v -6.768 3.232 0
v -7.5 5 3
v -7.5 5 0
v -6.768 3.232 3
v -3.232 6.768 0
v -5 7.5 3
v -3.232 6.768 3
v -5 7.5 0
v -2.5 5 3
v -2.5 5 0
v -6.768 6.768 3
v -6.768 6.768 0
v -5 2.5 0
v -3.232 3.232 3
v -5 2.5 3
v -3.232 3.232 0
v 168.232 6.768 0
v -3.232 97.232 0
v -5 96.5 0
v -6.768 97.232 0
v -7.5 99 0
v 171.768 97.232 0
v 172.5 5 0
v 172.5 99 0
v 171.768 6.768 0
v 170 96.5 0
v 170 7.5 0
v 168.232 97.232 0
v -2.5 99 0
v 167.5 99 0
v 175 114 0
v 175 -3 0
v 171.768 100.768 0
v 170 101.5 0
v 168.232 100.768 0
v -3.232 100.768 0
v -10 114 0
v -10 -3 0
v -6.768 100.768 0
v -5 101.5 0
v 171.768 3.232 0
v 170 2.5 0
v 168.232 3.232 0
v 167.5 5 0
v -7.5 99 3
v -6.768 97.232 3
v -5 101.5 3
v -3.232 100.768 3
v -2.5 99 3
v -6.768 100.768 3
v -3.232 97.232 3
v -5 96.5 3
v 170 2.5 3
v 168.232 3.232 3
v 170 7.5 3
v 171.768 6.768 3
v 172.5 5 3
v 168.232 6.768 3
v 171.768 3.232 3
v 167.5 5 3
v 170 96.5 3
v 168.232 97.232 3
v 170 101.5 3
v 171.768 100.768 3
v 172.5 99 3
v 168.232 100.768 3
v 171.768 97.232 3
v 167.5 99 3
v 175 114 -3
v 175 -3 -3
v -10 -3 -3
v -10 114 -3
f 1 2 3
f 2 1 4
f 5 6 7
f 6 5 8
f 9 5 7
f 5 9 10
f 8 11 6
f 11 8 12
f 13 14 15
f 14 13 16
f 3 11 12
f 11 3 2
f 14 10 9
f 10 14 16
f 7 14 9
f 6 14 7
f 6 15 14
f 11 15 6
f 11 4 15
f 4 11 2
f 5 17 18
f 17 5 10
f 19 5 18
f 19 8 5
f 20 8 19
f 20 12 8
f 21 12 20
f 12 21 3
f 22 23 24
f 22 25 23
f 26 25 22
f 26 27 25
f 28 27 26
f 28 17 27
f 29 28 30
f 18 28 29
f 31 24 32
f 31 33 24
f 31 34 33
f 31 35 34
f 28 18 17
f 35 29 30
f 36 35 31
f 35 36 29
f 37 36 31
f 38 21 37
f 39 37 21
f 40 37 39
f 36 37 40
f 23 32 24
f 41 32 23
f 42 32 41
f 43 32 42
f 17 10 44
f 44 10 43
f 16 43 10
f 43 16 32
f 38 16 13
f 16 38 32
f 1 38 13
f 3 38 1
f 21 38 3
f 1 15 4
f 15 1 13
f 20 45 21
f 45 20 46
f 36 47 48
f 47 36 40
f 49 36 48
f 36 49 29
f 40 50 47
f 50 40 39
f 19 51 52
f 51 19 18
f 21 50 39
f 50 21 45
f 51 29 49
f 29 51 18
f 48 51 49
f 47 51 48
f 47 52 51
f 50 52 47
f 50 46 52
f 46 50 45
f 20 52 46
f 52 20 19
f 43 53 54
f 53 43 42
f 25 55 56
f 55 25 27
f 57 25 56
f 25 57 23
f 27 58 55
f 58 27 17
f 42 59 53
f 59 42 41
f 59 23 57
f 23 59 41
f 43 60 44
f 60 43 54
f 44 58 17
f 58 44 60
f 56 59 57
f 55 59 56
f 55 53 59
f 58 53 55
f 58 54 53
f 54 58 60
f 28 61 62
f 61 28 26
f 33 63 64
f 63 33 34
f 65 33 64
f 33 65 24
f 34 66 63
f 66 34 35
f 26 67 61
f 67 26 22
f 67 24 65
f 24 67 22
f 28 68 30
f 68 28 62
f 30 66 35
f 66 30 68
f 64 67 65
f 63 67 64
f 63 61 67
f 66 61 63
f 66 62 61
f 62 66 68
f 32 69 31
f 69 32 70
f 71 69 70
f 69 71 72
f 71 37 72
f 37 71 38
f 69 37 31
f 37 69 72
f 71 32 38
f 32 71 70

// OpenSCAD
// Monitor
% cube([165, 104, 7.5]);

// Threaded Insert
module threadedInsert() {
    cylinder(3, 2.5, 2.5);
}

module threadedInserts() {
    translate([-5, 5, 0])
        threadedInsert();
    translate([-5, 104 - 5, 0])
        threadedInsert();
    translate([165 + 5, 5, 0])
        threadedInsert();
    translate([165 + 5, 104 -5, 0])
        threadedInsert();
}

threadedInserts();

// Faceplate


translate([-10, -3, -3])
    cube([165 + 20, 104 + 6 + 7, 3]);
